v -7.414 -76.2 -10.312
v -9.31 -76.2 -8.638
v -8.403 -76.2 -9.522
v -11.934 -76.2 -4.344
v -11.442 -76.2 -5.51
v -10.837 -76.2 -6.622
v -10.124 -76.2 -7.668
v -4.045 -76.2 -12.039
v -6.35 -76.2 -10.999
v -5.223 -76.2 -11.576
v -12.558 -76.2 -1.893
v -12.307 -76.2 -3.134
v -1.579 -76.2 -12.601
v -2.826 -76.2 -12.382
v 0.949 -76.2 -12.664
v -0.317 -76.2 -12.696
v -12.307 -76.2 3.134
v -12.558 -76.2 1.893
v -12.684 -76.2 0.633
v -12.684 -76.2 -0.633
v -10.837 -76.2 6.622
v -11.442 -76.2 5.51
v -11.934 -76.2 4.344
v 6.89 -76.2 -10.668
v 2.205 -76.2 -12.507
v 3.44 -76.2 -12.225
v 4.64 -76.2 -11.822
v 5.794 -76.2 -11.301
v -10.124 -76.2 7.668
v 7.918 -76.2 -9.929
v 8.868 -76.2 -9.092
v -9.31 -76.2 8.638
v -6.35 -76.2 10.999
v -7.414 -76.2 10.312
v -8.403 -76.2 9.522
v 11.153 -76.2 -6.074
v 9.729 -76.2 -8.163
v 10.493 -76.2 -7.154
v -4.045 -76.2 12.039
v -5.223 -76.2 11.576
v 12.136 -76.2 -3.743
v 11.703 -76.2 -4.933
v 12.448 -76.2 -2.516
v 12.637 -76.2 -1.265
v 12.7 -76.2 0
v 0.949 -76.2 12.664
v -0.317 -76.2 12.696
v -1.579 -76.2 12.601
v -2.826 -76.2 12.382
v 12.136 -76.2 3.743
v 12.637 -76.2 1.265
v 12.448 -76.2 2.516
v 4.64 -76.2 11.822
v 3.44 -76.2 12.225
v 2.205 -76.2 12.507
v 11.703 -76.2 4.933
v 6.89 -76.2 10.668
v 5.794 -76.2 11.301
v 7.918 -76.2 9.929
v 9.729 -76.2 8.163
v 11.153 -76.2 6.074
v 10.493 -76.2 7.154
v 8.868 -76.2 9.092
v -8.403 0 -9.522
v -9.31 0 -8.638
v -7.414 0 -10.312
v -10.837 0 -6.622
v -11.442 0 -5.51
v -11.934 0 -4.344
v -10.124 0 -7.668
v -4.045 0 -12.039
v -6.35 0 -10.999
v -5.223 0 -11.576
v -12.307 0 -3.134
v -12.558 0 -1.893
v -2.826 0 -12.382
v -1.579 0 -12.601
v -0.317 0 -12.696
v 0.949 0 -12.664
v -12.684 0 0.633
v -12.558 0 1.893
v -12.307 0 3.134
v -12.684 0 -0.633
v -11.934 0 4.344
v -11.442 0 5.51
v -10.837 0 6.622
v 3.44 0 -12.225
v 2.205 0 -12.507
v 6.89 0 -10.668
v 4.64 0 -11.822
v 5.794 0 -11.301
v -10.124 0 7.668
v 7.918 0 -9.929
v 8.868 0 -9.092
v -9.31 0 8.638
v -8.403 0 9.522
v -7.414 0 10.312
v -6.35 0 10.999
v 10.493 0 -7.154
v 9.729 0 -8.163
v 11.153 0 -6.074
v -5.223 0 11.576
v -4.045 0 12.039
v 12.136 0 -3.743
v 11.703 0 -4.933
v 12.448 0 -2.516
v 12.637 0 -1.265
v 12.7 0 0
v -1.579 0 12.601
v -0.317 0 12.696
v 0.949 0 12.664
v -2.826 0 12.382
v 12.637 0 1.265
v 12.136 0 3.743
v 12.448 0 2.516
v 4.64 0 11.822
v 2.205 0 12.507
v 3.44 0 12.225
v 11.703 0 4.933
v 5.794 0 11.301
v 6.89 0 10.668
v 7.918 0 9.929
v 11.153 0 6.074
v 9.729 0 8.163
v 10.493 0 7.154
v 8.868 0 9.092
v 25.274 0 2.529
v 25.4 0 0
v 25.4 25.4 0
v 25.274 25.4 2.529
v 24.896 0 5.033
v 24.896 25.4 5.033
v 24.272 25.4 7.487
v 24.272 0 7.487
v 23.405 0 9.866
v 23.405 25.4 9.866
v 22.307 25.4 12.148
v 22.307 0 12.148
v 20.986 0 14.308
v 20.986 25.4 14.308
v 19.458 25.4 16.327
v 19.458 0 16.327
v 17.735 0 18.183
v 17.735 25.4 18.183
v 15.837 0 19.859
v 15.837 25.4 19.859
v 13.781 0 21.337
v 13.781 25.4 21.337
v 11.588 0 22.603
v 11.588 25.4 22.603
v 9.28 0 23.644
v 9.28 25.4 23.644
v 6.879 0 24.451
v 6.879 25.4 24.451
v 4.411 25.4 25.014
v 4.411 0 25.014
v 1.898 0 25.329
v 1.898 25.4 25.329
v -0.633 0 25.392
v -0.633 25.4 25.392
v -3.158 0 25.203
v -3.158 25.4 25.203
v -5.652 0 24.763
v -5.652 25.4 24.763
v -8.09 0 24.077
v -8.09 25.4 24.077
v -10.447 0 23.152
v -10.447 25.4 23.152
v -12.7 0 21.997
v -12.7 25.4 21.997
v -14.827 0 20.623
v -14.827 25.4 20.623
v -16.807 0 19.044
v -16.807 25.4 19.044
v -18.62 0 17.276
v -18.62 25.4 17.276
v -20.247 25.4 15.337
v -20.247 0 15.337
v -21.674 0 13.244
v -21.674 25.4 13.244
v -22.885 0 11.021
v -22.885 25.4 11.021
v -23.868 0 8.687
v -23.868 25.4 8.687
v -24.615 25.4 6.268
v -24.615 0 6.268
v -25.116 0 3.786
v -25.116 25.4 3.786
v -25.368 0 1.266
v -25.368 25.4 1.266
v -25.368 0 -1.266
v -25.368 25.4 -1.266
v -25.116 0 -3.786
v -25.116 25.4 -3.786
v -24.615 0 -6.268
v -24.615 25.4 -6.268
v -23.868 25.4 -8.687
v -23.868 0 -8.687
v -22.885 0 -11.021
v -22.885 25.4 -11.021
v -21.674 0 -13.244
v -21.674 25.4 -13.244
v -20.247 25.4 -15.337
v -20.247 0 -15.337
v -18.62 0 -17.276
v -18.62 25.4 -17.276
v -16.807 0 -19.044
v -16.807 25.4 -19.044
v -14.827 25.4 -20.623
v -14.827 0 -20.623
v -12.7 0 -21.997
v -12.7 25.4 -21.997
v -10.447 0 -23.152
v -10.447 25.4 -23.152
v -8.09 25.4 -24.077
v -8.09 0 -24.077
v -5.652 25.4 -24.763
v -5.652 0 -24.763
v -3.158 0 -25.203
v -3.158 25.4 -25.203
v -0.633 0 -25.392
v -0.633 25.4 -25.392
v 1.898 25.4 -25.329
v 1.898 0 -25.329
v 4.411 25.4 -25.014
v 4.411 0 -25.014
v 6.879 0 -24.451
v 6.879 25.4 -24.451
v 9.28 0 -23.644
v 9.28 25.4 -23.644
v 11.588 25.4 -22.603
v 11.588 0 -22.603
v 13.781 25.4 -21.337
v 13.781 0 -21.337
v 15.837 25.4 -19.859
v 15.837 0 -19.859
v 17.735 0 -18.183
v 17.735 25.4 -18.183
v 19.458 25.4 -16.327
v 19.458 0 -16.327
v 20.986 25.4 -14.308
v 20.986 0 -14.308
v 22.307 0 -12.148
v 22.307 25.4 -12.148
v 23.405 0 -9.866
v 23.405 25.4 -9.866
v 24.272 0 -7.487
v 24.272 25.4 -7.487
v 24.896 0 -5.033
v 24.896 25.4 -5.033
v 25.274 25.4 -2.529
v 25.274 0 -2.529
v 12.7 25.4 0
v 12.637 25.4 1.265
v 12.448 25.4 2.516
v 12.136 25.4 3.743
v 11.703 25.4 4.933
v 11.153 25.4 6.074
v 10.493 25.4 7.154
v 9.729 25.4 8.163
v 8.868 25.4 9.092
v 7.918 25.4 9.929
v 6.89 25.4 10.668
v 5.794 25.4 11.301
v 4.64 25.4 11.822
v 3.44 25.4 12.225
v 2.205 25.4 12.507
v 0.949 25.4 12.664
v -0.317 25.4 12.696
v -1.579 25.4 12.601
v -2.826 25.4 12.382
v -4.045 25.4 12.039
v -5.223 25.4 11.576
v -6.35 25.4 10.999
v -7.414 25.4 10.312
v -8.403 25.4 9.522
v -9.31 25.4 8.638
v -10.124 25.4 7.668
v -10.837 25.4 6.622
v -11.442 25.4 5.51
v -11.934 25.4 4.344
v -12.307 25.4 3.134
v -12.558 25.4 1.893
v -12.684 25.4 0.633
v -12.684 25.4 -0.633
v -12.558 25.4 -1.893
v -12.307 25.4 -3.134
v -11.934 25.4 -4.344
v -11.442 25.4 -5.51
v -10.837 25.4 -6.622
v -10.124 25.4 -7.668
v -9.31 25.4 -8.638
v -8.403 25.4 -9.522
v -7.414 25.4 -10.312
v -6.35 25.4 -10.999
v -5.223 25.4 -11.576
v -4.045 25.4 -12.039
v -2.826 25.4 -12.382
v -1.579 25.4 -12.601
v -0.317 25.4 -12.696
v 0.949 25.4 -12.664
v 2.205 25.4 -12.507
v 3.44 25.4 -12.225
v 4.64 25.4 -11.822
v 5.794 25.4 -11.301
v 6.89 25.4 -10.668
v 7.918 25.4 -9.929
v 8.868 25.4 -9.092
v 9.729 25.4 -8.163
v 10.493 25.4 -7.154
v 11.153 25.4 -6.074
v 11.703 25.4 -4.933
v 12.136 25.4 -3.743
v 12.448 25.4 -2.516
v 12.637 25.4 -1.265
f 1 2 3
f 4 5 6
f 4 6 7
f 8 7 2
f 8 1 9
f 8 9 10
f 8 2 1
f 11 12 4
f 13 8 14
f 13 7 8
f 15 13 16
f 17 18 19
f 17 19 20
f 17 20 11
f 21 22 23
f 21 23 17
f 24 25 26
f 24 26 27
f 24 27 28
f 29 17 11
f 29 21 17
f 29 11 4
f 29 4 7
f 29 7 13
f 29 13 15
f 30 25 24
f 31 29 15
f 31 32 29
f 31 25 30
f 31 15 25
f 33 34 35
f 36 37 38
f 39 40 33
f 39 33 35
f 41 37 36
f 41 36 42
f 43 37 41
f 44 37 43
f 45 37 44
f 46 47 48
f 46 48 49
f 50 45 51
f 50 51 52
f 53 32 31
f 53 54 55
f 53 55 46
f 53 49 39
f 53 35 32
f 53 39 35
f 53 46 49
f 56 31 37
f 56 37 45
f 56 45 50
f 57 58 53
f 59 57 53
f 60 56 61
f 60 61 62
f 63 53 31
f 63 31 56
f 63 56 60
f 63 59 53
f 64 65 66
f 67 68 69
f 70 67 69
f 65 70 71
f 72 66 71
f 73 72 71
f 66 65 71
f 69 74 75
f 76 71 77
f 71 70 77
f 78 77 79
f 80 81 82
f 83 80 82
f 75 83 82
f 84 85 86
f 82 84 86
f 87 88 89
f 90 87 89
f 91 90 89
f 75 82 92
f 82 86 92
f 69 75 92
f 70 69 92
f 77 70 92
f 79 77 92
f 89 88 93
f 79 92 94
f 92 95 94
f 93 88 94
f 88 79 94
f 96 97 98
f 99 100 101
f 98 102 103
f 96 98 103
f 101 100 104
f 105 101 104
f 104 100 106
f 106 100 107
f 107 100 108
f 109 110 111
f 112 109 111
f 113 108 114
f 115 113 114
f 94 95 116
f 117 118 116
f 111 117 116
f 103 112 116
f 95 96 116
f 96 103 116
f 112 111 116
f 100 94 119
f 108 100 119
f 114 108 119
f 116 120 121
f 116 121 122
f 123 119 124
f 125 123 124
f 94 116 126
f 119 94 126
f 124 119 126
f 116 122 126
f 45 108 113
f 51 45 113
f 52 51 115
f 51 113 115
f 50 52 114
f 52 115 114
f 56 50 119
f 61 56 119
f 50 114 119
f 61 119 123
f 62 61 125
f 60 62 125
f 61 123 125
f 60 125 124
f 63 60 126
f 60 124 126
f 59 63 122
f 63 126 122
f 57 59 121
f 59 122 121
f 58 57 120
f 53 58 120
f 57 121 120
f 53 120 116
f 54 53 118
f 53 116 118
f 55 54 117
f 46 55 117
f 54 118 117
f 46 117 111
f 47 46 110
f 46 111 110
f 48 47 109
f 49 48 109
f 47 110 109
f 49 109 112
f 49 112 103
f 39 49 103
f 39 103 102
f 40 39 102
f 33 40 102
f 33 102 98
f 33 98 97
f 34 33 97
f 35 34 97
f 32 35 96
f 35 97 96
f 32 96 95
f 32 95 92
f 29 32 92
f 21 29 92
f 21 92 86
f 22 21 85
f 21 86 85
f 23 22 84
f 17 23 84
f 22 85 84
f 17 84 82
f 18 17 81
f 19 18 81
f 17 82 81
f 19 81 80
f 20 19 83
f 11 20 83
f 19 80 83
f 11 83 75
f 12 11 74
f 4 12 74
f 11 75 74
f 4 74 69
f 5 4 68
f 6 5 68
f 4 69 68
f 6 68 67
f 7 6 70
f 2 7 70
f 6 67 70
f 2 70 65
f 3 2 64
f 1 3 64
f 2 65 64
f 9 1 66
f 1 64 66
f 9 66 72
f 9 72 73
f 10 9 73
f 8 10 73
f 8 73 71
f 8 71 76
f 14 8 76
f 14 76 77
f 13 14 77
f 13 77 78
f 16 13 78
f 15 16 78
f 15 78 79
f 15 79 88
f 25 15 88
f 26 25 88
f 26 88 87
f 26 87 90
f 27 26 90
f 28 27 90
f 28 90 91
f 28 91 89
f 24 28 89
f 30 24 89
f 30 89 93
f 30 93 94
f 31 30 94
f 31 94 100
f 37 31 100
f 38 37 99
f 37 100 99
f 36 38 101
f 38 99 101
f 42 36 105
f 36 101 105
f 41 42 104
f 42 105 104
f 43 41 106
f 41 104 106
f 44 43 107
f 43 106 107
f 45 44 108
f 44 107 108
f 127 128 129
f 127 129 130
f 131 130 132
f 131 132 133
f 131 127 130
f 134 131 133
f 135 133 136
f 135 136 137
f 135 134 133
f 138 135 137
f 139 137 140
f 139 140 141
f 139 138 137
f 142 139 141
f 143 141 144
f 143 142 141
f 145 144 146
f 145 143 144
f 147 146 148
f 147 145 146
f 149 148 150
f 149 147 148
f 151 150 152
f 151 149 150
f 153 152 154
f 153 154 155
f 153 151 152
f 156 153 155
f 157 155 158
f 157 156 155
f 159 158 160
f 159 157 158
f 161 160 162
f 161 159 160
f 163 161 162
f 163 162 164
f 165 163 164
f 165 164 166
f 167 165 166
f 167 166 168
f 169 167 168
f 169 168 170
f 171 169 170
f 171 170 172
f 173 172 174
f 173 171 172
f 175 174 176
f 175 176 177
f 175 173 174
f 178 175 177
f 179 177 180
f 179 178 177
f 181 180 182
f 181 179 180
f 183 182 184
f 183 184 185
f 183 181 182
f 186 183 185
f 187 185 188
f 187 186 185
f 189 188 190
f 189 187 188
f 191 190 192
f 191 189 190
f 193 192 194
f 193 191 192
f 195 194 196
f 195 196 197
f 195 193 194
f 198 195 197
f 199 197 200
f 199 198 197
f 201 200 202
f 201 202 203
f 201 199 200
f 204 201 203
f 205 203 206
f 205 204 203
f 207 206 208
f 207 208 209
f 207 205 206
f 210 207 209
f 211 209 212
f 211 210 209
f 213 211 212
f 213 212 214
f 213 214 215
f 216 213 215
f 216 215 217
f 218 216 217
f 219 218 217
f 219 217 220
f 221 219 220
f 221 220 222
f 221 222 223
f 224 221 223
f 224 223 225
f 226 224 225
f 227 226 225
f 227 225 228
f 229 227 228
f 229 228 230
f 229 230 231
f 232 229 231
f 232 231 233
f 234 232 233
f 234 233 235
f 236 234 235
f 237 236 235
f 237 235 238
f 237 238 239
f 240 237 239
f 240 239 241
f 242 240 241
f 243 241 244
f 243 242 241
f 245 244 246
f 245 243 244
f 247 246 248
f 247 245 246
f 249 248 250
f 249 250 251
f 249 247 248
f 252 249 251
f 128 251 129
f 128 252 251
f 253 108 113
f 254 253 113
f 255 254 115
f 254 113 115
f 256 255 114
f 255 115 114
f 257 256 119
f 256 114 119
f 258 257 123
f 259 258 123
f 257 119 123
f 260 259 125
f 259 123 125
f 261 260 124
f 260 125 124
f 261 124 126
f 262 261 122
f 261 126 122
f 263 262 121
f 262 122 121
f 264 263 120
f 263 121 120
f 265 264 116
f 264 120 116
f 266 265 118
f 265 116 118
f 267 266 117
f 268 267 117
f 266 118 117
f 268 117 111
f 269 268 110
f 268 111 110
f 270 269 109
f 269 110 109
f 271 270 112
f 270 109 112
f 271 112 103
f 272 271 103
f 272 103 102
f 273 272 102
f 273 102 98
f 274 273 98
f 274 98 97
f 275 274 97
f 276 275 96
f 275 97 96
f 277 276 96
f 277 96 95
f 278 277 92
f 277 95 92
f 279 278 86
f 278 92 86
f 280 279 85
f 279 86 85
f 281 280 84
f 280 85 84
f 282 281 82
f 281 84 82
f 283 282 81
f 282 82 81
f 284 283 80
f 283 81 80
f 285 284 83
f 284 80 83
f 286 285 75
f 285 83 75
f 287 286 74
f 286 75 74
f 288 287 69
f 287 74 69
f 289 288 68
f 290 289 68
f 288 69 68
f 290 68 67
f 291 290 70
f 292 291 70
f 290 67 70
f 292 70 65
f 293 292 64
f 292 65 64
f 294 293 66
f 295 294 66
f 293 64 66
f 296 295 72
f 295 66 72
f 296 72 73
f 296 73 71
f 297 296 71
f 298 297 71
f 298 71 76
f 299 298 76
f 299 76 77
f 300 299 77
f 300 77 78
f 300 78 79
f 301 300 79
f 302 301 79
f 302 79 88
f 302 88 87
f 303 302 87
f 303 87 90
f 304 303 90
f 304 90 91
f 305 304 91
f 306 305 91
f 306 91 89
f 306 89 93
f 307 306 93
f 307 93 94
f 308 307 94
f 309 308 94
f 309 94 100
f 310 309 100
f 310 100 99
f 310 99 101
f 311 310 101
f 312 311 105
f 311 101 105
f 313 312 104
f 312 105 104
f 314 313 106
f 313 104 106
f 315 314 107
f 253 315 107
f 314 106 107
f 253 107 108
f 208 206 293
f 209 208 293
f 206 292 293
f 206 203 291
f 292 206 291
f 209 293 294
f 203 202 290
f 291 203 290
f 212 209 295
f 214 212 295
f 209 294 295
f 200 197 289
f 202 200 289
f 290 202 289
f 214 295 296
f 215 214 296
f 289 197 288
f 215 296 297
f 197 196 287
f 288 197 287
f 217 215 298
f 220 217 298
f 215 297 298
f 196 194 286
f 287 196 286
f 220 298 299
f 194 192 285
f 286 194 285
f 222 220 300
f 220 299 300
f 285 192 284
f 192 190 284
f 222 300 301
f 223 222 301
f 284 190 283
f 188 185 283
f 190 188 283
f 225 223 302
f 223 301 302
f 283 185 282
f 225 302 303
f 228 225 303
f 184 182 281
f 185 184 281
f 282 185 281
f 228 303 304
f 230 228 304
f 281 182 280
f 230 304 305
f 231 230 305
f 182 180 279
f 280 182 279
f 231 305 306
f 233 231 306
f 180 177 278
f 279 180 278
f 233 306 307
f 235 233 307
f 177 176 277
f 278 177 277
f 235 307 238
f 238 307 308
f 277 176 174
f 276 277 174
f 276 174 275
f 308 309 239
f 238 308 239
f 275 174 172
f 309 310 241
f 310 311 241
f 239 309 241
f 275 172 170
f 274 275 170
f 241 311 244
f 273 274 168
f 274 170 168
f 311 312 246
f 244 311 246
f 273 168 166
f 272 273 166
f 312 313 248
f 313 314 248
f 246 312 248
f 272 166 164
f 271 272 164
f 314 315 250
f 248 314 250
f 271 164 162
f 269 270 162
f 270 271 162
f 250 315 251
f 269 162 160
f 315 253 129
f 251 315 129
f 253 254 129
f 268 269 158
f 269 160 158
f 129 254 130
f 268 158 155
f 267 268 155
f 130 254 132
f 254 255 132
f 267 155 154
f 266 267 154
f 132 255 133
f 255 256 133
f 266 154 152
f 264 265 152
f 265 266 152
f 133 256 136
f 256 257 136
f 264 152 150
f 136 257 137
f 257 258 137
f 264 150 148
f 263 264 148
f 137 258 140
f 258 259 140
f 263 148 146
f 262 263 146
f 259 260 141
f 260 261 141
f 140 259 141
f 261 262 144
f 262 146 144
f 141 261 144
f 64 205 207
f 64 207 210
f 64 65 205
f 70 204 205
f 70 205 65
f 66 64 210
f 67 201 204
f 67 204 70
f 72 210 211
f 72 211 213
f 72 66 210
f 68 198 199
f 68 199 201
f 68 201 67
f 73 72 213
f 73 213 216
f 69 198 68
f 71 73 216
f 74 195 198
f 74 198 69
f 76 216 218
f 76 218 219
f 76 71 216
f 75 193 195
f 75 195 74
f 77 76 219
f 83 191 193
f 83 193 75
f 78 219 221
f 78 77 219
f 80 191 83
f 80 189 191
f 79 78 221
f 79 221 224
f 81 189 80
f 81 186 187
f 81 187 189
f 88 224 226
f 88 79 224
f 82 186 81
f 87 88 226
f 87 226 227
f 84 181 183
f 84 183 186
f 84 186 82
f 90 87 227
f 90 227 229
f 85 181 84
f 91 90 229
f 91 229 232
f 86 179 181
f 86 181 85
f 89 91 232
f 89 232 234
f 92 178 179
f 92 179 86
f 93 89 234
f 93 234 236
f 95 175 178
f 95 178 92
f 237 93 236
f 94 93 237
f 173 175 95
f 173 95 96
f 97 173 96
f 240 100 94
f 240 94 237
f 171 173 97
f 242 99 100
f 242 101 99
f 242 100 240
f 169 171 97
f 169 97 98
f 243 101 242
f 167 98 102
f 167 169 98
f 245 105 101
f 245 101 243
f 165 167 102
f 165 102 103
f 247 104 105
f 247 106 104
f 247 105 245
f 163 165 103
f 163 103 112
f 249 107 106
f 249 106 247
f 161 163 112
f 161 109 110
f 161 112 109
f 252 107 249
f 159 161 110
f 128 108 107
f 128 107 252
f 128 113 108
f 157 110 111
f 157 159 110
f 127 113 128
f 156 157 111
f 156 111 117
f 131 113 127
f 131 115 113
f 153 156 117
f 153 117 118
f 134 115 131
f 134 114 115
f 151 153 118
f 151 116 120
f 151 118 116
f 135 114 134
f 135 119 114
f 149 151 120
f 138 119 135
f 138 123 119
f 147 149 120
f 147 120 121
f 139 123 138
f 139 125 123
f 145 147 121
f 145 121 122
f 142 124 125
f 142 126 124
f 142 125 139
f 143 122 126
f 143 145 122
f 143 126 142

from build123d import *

# Parameters (mm, degrees)
F0_R     = 12.7
F1_DEPTH = 76.2
F0_R_2   = 25.4
F2_DEPTH = 25.4


with BuildPart() as f1:
    # F0 (on Front) → F1 (new body)
    with BuildSketch(Plane.XZ):
        Circle(F0_R)
    extrude(amount=F1_DEPTH)

    # F0 (on Front) → F2 (join)
    with BuildSketch(Plane.XZ):
        Circle(F0_R_2)
        Circle(F0_R, mode=Mode.SUBTRACT)
    extrude(amount=-F2_DEPTH)


solid = f1.part
